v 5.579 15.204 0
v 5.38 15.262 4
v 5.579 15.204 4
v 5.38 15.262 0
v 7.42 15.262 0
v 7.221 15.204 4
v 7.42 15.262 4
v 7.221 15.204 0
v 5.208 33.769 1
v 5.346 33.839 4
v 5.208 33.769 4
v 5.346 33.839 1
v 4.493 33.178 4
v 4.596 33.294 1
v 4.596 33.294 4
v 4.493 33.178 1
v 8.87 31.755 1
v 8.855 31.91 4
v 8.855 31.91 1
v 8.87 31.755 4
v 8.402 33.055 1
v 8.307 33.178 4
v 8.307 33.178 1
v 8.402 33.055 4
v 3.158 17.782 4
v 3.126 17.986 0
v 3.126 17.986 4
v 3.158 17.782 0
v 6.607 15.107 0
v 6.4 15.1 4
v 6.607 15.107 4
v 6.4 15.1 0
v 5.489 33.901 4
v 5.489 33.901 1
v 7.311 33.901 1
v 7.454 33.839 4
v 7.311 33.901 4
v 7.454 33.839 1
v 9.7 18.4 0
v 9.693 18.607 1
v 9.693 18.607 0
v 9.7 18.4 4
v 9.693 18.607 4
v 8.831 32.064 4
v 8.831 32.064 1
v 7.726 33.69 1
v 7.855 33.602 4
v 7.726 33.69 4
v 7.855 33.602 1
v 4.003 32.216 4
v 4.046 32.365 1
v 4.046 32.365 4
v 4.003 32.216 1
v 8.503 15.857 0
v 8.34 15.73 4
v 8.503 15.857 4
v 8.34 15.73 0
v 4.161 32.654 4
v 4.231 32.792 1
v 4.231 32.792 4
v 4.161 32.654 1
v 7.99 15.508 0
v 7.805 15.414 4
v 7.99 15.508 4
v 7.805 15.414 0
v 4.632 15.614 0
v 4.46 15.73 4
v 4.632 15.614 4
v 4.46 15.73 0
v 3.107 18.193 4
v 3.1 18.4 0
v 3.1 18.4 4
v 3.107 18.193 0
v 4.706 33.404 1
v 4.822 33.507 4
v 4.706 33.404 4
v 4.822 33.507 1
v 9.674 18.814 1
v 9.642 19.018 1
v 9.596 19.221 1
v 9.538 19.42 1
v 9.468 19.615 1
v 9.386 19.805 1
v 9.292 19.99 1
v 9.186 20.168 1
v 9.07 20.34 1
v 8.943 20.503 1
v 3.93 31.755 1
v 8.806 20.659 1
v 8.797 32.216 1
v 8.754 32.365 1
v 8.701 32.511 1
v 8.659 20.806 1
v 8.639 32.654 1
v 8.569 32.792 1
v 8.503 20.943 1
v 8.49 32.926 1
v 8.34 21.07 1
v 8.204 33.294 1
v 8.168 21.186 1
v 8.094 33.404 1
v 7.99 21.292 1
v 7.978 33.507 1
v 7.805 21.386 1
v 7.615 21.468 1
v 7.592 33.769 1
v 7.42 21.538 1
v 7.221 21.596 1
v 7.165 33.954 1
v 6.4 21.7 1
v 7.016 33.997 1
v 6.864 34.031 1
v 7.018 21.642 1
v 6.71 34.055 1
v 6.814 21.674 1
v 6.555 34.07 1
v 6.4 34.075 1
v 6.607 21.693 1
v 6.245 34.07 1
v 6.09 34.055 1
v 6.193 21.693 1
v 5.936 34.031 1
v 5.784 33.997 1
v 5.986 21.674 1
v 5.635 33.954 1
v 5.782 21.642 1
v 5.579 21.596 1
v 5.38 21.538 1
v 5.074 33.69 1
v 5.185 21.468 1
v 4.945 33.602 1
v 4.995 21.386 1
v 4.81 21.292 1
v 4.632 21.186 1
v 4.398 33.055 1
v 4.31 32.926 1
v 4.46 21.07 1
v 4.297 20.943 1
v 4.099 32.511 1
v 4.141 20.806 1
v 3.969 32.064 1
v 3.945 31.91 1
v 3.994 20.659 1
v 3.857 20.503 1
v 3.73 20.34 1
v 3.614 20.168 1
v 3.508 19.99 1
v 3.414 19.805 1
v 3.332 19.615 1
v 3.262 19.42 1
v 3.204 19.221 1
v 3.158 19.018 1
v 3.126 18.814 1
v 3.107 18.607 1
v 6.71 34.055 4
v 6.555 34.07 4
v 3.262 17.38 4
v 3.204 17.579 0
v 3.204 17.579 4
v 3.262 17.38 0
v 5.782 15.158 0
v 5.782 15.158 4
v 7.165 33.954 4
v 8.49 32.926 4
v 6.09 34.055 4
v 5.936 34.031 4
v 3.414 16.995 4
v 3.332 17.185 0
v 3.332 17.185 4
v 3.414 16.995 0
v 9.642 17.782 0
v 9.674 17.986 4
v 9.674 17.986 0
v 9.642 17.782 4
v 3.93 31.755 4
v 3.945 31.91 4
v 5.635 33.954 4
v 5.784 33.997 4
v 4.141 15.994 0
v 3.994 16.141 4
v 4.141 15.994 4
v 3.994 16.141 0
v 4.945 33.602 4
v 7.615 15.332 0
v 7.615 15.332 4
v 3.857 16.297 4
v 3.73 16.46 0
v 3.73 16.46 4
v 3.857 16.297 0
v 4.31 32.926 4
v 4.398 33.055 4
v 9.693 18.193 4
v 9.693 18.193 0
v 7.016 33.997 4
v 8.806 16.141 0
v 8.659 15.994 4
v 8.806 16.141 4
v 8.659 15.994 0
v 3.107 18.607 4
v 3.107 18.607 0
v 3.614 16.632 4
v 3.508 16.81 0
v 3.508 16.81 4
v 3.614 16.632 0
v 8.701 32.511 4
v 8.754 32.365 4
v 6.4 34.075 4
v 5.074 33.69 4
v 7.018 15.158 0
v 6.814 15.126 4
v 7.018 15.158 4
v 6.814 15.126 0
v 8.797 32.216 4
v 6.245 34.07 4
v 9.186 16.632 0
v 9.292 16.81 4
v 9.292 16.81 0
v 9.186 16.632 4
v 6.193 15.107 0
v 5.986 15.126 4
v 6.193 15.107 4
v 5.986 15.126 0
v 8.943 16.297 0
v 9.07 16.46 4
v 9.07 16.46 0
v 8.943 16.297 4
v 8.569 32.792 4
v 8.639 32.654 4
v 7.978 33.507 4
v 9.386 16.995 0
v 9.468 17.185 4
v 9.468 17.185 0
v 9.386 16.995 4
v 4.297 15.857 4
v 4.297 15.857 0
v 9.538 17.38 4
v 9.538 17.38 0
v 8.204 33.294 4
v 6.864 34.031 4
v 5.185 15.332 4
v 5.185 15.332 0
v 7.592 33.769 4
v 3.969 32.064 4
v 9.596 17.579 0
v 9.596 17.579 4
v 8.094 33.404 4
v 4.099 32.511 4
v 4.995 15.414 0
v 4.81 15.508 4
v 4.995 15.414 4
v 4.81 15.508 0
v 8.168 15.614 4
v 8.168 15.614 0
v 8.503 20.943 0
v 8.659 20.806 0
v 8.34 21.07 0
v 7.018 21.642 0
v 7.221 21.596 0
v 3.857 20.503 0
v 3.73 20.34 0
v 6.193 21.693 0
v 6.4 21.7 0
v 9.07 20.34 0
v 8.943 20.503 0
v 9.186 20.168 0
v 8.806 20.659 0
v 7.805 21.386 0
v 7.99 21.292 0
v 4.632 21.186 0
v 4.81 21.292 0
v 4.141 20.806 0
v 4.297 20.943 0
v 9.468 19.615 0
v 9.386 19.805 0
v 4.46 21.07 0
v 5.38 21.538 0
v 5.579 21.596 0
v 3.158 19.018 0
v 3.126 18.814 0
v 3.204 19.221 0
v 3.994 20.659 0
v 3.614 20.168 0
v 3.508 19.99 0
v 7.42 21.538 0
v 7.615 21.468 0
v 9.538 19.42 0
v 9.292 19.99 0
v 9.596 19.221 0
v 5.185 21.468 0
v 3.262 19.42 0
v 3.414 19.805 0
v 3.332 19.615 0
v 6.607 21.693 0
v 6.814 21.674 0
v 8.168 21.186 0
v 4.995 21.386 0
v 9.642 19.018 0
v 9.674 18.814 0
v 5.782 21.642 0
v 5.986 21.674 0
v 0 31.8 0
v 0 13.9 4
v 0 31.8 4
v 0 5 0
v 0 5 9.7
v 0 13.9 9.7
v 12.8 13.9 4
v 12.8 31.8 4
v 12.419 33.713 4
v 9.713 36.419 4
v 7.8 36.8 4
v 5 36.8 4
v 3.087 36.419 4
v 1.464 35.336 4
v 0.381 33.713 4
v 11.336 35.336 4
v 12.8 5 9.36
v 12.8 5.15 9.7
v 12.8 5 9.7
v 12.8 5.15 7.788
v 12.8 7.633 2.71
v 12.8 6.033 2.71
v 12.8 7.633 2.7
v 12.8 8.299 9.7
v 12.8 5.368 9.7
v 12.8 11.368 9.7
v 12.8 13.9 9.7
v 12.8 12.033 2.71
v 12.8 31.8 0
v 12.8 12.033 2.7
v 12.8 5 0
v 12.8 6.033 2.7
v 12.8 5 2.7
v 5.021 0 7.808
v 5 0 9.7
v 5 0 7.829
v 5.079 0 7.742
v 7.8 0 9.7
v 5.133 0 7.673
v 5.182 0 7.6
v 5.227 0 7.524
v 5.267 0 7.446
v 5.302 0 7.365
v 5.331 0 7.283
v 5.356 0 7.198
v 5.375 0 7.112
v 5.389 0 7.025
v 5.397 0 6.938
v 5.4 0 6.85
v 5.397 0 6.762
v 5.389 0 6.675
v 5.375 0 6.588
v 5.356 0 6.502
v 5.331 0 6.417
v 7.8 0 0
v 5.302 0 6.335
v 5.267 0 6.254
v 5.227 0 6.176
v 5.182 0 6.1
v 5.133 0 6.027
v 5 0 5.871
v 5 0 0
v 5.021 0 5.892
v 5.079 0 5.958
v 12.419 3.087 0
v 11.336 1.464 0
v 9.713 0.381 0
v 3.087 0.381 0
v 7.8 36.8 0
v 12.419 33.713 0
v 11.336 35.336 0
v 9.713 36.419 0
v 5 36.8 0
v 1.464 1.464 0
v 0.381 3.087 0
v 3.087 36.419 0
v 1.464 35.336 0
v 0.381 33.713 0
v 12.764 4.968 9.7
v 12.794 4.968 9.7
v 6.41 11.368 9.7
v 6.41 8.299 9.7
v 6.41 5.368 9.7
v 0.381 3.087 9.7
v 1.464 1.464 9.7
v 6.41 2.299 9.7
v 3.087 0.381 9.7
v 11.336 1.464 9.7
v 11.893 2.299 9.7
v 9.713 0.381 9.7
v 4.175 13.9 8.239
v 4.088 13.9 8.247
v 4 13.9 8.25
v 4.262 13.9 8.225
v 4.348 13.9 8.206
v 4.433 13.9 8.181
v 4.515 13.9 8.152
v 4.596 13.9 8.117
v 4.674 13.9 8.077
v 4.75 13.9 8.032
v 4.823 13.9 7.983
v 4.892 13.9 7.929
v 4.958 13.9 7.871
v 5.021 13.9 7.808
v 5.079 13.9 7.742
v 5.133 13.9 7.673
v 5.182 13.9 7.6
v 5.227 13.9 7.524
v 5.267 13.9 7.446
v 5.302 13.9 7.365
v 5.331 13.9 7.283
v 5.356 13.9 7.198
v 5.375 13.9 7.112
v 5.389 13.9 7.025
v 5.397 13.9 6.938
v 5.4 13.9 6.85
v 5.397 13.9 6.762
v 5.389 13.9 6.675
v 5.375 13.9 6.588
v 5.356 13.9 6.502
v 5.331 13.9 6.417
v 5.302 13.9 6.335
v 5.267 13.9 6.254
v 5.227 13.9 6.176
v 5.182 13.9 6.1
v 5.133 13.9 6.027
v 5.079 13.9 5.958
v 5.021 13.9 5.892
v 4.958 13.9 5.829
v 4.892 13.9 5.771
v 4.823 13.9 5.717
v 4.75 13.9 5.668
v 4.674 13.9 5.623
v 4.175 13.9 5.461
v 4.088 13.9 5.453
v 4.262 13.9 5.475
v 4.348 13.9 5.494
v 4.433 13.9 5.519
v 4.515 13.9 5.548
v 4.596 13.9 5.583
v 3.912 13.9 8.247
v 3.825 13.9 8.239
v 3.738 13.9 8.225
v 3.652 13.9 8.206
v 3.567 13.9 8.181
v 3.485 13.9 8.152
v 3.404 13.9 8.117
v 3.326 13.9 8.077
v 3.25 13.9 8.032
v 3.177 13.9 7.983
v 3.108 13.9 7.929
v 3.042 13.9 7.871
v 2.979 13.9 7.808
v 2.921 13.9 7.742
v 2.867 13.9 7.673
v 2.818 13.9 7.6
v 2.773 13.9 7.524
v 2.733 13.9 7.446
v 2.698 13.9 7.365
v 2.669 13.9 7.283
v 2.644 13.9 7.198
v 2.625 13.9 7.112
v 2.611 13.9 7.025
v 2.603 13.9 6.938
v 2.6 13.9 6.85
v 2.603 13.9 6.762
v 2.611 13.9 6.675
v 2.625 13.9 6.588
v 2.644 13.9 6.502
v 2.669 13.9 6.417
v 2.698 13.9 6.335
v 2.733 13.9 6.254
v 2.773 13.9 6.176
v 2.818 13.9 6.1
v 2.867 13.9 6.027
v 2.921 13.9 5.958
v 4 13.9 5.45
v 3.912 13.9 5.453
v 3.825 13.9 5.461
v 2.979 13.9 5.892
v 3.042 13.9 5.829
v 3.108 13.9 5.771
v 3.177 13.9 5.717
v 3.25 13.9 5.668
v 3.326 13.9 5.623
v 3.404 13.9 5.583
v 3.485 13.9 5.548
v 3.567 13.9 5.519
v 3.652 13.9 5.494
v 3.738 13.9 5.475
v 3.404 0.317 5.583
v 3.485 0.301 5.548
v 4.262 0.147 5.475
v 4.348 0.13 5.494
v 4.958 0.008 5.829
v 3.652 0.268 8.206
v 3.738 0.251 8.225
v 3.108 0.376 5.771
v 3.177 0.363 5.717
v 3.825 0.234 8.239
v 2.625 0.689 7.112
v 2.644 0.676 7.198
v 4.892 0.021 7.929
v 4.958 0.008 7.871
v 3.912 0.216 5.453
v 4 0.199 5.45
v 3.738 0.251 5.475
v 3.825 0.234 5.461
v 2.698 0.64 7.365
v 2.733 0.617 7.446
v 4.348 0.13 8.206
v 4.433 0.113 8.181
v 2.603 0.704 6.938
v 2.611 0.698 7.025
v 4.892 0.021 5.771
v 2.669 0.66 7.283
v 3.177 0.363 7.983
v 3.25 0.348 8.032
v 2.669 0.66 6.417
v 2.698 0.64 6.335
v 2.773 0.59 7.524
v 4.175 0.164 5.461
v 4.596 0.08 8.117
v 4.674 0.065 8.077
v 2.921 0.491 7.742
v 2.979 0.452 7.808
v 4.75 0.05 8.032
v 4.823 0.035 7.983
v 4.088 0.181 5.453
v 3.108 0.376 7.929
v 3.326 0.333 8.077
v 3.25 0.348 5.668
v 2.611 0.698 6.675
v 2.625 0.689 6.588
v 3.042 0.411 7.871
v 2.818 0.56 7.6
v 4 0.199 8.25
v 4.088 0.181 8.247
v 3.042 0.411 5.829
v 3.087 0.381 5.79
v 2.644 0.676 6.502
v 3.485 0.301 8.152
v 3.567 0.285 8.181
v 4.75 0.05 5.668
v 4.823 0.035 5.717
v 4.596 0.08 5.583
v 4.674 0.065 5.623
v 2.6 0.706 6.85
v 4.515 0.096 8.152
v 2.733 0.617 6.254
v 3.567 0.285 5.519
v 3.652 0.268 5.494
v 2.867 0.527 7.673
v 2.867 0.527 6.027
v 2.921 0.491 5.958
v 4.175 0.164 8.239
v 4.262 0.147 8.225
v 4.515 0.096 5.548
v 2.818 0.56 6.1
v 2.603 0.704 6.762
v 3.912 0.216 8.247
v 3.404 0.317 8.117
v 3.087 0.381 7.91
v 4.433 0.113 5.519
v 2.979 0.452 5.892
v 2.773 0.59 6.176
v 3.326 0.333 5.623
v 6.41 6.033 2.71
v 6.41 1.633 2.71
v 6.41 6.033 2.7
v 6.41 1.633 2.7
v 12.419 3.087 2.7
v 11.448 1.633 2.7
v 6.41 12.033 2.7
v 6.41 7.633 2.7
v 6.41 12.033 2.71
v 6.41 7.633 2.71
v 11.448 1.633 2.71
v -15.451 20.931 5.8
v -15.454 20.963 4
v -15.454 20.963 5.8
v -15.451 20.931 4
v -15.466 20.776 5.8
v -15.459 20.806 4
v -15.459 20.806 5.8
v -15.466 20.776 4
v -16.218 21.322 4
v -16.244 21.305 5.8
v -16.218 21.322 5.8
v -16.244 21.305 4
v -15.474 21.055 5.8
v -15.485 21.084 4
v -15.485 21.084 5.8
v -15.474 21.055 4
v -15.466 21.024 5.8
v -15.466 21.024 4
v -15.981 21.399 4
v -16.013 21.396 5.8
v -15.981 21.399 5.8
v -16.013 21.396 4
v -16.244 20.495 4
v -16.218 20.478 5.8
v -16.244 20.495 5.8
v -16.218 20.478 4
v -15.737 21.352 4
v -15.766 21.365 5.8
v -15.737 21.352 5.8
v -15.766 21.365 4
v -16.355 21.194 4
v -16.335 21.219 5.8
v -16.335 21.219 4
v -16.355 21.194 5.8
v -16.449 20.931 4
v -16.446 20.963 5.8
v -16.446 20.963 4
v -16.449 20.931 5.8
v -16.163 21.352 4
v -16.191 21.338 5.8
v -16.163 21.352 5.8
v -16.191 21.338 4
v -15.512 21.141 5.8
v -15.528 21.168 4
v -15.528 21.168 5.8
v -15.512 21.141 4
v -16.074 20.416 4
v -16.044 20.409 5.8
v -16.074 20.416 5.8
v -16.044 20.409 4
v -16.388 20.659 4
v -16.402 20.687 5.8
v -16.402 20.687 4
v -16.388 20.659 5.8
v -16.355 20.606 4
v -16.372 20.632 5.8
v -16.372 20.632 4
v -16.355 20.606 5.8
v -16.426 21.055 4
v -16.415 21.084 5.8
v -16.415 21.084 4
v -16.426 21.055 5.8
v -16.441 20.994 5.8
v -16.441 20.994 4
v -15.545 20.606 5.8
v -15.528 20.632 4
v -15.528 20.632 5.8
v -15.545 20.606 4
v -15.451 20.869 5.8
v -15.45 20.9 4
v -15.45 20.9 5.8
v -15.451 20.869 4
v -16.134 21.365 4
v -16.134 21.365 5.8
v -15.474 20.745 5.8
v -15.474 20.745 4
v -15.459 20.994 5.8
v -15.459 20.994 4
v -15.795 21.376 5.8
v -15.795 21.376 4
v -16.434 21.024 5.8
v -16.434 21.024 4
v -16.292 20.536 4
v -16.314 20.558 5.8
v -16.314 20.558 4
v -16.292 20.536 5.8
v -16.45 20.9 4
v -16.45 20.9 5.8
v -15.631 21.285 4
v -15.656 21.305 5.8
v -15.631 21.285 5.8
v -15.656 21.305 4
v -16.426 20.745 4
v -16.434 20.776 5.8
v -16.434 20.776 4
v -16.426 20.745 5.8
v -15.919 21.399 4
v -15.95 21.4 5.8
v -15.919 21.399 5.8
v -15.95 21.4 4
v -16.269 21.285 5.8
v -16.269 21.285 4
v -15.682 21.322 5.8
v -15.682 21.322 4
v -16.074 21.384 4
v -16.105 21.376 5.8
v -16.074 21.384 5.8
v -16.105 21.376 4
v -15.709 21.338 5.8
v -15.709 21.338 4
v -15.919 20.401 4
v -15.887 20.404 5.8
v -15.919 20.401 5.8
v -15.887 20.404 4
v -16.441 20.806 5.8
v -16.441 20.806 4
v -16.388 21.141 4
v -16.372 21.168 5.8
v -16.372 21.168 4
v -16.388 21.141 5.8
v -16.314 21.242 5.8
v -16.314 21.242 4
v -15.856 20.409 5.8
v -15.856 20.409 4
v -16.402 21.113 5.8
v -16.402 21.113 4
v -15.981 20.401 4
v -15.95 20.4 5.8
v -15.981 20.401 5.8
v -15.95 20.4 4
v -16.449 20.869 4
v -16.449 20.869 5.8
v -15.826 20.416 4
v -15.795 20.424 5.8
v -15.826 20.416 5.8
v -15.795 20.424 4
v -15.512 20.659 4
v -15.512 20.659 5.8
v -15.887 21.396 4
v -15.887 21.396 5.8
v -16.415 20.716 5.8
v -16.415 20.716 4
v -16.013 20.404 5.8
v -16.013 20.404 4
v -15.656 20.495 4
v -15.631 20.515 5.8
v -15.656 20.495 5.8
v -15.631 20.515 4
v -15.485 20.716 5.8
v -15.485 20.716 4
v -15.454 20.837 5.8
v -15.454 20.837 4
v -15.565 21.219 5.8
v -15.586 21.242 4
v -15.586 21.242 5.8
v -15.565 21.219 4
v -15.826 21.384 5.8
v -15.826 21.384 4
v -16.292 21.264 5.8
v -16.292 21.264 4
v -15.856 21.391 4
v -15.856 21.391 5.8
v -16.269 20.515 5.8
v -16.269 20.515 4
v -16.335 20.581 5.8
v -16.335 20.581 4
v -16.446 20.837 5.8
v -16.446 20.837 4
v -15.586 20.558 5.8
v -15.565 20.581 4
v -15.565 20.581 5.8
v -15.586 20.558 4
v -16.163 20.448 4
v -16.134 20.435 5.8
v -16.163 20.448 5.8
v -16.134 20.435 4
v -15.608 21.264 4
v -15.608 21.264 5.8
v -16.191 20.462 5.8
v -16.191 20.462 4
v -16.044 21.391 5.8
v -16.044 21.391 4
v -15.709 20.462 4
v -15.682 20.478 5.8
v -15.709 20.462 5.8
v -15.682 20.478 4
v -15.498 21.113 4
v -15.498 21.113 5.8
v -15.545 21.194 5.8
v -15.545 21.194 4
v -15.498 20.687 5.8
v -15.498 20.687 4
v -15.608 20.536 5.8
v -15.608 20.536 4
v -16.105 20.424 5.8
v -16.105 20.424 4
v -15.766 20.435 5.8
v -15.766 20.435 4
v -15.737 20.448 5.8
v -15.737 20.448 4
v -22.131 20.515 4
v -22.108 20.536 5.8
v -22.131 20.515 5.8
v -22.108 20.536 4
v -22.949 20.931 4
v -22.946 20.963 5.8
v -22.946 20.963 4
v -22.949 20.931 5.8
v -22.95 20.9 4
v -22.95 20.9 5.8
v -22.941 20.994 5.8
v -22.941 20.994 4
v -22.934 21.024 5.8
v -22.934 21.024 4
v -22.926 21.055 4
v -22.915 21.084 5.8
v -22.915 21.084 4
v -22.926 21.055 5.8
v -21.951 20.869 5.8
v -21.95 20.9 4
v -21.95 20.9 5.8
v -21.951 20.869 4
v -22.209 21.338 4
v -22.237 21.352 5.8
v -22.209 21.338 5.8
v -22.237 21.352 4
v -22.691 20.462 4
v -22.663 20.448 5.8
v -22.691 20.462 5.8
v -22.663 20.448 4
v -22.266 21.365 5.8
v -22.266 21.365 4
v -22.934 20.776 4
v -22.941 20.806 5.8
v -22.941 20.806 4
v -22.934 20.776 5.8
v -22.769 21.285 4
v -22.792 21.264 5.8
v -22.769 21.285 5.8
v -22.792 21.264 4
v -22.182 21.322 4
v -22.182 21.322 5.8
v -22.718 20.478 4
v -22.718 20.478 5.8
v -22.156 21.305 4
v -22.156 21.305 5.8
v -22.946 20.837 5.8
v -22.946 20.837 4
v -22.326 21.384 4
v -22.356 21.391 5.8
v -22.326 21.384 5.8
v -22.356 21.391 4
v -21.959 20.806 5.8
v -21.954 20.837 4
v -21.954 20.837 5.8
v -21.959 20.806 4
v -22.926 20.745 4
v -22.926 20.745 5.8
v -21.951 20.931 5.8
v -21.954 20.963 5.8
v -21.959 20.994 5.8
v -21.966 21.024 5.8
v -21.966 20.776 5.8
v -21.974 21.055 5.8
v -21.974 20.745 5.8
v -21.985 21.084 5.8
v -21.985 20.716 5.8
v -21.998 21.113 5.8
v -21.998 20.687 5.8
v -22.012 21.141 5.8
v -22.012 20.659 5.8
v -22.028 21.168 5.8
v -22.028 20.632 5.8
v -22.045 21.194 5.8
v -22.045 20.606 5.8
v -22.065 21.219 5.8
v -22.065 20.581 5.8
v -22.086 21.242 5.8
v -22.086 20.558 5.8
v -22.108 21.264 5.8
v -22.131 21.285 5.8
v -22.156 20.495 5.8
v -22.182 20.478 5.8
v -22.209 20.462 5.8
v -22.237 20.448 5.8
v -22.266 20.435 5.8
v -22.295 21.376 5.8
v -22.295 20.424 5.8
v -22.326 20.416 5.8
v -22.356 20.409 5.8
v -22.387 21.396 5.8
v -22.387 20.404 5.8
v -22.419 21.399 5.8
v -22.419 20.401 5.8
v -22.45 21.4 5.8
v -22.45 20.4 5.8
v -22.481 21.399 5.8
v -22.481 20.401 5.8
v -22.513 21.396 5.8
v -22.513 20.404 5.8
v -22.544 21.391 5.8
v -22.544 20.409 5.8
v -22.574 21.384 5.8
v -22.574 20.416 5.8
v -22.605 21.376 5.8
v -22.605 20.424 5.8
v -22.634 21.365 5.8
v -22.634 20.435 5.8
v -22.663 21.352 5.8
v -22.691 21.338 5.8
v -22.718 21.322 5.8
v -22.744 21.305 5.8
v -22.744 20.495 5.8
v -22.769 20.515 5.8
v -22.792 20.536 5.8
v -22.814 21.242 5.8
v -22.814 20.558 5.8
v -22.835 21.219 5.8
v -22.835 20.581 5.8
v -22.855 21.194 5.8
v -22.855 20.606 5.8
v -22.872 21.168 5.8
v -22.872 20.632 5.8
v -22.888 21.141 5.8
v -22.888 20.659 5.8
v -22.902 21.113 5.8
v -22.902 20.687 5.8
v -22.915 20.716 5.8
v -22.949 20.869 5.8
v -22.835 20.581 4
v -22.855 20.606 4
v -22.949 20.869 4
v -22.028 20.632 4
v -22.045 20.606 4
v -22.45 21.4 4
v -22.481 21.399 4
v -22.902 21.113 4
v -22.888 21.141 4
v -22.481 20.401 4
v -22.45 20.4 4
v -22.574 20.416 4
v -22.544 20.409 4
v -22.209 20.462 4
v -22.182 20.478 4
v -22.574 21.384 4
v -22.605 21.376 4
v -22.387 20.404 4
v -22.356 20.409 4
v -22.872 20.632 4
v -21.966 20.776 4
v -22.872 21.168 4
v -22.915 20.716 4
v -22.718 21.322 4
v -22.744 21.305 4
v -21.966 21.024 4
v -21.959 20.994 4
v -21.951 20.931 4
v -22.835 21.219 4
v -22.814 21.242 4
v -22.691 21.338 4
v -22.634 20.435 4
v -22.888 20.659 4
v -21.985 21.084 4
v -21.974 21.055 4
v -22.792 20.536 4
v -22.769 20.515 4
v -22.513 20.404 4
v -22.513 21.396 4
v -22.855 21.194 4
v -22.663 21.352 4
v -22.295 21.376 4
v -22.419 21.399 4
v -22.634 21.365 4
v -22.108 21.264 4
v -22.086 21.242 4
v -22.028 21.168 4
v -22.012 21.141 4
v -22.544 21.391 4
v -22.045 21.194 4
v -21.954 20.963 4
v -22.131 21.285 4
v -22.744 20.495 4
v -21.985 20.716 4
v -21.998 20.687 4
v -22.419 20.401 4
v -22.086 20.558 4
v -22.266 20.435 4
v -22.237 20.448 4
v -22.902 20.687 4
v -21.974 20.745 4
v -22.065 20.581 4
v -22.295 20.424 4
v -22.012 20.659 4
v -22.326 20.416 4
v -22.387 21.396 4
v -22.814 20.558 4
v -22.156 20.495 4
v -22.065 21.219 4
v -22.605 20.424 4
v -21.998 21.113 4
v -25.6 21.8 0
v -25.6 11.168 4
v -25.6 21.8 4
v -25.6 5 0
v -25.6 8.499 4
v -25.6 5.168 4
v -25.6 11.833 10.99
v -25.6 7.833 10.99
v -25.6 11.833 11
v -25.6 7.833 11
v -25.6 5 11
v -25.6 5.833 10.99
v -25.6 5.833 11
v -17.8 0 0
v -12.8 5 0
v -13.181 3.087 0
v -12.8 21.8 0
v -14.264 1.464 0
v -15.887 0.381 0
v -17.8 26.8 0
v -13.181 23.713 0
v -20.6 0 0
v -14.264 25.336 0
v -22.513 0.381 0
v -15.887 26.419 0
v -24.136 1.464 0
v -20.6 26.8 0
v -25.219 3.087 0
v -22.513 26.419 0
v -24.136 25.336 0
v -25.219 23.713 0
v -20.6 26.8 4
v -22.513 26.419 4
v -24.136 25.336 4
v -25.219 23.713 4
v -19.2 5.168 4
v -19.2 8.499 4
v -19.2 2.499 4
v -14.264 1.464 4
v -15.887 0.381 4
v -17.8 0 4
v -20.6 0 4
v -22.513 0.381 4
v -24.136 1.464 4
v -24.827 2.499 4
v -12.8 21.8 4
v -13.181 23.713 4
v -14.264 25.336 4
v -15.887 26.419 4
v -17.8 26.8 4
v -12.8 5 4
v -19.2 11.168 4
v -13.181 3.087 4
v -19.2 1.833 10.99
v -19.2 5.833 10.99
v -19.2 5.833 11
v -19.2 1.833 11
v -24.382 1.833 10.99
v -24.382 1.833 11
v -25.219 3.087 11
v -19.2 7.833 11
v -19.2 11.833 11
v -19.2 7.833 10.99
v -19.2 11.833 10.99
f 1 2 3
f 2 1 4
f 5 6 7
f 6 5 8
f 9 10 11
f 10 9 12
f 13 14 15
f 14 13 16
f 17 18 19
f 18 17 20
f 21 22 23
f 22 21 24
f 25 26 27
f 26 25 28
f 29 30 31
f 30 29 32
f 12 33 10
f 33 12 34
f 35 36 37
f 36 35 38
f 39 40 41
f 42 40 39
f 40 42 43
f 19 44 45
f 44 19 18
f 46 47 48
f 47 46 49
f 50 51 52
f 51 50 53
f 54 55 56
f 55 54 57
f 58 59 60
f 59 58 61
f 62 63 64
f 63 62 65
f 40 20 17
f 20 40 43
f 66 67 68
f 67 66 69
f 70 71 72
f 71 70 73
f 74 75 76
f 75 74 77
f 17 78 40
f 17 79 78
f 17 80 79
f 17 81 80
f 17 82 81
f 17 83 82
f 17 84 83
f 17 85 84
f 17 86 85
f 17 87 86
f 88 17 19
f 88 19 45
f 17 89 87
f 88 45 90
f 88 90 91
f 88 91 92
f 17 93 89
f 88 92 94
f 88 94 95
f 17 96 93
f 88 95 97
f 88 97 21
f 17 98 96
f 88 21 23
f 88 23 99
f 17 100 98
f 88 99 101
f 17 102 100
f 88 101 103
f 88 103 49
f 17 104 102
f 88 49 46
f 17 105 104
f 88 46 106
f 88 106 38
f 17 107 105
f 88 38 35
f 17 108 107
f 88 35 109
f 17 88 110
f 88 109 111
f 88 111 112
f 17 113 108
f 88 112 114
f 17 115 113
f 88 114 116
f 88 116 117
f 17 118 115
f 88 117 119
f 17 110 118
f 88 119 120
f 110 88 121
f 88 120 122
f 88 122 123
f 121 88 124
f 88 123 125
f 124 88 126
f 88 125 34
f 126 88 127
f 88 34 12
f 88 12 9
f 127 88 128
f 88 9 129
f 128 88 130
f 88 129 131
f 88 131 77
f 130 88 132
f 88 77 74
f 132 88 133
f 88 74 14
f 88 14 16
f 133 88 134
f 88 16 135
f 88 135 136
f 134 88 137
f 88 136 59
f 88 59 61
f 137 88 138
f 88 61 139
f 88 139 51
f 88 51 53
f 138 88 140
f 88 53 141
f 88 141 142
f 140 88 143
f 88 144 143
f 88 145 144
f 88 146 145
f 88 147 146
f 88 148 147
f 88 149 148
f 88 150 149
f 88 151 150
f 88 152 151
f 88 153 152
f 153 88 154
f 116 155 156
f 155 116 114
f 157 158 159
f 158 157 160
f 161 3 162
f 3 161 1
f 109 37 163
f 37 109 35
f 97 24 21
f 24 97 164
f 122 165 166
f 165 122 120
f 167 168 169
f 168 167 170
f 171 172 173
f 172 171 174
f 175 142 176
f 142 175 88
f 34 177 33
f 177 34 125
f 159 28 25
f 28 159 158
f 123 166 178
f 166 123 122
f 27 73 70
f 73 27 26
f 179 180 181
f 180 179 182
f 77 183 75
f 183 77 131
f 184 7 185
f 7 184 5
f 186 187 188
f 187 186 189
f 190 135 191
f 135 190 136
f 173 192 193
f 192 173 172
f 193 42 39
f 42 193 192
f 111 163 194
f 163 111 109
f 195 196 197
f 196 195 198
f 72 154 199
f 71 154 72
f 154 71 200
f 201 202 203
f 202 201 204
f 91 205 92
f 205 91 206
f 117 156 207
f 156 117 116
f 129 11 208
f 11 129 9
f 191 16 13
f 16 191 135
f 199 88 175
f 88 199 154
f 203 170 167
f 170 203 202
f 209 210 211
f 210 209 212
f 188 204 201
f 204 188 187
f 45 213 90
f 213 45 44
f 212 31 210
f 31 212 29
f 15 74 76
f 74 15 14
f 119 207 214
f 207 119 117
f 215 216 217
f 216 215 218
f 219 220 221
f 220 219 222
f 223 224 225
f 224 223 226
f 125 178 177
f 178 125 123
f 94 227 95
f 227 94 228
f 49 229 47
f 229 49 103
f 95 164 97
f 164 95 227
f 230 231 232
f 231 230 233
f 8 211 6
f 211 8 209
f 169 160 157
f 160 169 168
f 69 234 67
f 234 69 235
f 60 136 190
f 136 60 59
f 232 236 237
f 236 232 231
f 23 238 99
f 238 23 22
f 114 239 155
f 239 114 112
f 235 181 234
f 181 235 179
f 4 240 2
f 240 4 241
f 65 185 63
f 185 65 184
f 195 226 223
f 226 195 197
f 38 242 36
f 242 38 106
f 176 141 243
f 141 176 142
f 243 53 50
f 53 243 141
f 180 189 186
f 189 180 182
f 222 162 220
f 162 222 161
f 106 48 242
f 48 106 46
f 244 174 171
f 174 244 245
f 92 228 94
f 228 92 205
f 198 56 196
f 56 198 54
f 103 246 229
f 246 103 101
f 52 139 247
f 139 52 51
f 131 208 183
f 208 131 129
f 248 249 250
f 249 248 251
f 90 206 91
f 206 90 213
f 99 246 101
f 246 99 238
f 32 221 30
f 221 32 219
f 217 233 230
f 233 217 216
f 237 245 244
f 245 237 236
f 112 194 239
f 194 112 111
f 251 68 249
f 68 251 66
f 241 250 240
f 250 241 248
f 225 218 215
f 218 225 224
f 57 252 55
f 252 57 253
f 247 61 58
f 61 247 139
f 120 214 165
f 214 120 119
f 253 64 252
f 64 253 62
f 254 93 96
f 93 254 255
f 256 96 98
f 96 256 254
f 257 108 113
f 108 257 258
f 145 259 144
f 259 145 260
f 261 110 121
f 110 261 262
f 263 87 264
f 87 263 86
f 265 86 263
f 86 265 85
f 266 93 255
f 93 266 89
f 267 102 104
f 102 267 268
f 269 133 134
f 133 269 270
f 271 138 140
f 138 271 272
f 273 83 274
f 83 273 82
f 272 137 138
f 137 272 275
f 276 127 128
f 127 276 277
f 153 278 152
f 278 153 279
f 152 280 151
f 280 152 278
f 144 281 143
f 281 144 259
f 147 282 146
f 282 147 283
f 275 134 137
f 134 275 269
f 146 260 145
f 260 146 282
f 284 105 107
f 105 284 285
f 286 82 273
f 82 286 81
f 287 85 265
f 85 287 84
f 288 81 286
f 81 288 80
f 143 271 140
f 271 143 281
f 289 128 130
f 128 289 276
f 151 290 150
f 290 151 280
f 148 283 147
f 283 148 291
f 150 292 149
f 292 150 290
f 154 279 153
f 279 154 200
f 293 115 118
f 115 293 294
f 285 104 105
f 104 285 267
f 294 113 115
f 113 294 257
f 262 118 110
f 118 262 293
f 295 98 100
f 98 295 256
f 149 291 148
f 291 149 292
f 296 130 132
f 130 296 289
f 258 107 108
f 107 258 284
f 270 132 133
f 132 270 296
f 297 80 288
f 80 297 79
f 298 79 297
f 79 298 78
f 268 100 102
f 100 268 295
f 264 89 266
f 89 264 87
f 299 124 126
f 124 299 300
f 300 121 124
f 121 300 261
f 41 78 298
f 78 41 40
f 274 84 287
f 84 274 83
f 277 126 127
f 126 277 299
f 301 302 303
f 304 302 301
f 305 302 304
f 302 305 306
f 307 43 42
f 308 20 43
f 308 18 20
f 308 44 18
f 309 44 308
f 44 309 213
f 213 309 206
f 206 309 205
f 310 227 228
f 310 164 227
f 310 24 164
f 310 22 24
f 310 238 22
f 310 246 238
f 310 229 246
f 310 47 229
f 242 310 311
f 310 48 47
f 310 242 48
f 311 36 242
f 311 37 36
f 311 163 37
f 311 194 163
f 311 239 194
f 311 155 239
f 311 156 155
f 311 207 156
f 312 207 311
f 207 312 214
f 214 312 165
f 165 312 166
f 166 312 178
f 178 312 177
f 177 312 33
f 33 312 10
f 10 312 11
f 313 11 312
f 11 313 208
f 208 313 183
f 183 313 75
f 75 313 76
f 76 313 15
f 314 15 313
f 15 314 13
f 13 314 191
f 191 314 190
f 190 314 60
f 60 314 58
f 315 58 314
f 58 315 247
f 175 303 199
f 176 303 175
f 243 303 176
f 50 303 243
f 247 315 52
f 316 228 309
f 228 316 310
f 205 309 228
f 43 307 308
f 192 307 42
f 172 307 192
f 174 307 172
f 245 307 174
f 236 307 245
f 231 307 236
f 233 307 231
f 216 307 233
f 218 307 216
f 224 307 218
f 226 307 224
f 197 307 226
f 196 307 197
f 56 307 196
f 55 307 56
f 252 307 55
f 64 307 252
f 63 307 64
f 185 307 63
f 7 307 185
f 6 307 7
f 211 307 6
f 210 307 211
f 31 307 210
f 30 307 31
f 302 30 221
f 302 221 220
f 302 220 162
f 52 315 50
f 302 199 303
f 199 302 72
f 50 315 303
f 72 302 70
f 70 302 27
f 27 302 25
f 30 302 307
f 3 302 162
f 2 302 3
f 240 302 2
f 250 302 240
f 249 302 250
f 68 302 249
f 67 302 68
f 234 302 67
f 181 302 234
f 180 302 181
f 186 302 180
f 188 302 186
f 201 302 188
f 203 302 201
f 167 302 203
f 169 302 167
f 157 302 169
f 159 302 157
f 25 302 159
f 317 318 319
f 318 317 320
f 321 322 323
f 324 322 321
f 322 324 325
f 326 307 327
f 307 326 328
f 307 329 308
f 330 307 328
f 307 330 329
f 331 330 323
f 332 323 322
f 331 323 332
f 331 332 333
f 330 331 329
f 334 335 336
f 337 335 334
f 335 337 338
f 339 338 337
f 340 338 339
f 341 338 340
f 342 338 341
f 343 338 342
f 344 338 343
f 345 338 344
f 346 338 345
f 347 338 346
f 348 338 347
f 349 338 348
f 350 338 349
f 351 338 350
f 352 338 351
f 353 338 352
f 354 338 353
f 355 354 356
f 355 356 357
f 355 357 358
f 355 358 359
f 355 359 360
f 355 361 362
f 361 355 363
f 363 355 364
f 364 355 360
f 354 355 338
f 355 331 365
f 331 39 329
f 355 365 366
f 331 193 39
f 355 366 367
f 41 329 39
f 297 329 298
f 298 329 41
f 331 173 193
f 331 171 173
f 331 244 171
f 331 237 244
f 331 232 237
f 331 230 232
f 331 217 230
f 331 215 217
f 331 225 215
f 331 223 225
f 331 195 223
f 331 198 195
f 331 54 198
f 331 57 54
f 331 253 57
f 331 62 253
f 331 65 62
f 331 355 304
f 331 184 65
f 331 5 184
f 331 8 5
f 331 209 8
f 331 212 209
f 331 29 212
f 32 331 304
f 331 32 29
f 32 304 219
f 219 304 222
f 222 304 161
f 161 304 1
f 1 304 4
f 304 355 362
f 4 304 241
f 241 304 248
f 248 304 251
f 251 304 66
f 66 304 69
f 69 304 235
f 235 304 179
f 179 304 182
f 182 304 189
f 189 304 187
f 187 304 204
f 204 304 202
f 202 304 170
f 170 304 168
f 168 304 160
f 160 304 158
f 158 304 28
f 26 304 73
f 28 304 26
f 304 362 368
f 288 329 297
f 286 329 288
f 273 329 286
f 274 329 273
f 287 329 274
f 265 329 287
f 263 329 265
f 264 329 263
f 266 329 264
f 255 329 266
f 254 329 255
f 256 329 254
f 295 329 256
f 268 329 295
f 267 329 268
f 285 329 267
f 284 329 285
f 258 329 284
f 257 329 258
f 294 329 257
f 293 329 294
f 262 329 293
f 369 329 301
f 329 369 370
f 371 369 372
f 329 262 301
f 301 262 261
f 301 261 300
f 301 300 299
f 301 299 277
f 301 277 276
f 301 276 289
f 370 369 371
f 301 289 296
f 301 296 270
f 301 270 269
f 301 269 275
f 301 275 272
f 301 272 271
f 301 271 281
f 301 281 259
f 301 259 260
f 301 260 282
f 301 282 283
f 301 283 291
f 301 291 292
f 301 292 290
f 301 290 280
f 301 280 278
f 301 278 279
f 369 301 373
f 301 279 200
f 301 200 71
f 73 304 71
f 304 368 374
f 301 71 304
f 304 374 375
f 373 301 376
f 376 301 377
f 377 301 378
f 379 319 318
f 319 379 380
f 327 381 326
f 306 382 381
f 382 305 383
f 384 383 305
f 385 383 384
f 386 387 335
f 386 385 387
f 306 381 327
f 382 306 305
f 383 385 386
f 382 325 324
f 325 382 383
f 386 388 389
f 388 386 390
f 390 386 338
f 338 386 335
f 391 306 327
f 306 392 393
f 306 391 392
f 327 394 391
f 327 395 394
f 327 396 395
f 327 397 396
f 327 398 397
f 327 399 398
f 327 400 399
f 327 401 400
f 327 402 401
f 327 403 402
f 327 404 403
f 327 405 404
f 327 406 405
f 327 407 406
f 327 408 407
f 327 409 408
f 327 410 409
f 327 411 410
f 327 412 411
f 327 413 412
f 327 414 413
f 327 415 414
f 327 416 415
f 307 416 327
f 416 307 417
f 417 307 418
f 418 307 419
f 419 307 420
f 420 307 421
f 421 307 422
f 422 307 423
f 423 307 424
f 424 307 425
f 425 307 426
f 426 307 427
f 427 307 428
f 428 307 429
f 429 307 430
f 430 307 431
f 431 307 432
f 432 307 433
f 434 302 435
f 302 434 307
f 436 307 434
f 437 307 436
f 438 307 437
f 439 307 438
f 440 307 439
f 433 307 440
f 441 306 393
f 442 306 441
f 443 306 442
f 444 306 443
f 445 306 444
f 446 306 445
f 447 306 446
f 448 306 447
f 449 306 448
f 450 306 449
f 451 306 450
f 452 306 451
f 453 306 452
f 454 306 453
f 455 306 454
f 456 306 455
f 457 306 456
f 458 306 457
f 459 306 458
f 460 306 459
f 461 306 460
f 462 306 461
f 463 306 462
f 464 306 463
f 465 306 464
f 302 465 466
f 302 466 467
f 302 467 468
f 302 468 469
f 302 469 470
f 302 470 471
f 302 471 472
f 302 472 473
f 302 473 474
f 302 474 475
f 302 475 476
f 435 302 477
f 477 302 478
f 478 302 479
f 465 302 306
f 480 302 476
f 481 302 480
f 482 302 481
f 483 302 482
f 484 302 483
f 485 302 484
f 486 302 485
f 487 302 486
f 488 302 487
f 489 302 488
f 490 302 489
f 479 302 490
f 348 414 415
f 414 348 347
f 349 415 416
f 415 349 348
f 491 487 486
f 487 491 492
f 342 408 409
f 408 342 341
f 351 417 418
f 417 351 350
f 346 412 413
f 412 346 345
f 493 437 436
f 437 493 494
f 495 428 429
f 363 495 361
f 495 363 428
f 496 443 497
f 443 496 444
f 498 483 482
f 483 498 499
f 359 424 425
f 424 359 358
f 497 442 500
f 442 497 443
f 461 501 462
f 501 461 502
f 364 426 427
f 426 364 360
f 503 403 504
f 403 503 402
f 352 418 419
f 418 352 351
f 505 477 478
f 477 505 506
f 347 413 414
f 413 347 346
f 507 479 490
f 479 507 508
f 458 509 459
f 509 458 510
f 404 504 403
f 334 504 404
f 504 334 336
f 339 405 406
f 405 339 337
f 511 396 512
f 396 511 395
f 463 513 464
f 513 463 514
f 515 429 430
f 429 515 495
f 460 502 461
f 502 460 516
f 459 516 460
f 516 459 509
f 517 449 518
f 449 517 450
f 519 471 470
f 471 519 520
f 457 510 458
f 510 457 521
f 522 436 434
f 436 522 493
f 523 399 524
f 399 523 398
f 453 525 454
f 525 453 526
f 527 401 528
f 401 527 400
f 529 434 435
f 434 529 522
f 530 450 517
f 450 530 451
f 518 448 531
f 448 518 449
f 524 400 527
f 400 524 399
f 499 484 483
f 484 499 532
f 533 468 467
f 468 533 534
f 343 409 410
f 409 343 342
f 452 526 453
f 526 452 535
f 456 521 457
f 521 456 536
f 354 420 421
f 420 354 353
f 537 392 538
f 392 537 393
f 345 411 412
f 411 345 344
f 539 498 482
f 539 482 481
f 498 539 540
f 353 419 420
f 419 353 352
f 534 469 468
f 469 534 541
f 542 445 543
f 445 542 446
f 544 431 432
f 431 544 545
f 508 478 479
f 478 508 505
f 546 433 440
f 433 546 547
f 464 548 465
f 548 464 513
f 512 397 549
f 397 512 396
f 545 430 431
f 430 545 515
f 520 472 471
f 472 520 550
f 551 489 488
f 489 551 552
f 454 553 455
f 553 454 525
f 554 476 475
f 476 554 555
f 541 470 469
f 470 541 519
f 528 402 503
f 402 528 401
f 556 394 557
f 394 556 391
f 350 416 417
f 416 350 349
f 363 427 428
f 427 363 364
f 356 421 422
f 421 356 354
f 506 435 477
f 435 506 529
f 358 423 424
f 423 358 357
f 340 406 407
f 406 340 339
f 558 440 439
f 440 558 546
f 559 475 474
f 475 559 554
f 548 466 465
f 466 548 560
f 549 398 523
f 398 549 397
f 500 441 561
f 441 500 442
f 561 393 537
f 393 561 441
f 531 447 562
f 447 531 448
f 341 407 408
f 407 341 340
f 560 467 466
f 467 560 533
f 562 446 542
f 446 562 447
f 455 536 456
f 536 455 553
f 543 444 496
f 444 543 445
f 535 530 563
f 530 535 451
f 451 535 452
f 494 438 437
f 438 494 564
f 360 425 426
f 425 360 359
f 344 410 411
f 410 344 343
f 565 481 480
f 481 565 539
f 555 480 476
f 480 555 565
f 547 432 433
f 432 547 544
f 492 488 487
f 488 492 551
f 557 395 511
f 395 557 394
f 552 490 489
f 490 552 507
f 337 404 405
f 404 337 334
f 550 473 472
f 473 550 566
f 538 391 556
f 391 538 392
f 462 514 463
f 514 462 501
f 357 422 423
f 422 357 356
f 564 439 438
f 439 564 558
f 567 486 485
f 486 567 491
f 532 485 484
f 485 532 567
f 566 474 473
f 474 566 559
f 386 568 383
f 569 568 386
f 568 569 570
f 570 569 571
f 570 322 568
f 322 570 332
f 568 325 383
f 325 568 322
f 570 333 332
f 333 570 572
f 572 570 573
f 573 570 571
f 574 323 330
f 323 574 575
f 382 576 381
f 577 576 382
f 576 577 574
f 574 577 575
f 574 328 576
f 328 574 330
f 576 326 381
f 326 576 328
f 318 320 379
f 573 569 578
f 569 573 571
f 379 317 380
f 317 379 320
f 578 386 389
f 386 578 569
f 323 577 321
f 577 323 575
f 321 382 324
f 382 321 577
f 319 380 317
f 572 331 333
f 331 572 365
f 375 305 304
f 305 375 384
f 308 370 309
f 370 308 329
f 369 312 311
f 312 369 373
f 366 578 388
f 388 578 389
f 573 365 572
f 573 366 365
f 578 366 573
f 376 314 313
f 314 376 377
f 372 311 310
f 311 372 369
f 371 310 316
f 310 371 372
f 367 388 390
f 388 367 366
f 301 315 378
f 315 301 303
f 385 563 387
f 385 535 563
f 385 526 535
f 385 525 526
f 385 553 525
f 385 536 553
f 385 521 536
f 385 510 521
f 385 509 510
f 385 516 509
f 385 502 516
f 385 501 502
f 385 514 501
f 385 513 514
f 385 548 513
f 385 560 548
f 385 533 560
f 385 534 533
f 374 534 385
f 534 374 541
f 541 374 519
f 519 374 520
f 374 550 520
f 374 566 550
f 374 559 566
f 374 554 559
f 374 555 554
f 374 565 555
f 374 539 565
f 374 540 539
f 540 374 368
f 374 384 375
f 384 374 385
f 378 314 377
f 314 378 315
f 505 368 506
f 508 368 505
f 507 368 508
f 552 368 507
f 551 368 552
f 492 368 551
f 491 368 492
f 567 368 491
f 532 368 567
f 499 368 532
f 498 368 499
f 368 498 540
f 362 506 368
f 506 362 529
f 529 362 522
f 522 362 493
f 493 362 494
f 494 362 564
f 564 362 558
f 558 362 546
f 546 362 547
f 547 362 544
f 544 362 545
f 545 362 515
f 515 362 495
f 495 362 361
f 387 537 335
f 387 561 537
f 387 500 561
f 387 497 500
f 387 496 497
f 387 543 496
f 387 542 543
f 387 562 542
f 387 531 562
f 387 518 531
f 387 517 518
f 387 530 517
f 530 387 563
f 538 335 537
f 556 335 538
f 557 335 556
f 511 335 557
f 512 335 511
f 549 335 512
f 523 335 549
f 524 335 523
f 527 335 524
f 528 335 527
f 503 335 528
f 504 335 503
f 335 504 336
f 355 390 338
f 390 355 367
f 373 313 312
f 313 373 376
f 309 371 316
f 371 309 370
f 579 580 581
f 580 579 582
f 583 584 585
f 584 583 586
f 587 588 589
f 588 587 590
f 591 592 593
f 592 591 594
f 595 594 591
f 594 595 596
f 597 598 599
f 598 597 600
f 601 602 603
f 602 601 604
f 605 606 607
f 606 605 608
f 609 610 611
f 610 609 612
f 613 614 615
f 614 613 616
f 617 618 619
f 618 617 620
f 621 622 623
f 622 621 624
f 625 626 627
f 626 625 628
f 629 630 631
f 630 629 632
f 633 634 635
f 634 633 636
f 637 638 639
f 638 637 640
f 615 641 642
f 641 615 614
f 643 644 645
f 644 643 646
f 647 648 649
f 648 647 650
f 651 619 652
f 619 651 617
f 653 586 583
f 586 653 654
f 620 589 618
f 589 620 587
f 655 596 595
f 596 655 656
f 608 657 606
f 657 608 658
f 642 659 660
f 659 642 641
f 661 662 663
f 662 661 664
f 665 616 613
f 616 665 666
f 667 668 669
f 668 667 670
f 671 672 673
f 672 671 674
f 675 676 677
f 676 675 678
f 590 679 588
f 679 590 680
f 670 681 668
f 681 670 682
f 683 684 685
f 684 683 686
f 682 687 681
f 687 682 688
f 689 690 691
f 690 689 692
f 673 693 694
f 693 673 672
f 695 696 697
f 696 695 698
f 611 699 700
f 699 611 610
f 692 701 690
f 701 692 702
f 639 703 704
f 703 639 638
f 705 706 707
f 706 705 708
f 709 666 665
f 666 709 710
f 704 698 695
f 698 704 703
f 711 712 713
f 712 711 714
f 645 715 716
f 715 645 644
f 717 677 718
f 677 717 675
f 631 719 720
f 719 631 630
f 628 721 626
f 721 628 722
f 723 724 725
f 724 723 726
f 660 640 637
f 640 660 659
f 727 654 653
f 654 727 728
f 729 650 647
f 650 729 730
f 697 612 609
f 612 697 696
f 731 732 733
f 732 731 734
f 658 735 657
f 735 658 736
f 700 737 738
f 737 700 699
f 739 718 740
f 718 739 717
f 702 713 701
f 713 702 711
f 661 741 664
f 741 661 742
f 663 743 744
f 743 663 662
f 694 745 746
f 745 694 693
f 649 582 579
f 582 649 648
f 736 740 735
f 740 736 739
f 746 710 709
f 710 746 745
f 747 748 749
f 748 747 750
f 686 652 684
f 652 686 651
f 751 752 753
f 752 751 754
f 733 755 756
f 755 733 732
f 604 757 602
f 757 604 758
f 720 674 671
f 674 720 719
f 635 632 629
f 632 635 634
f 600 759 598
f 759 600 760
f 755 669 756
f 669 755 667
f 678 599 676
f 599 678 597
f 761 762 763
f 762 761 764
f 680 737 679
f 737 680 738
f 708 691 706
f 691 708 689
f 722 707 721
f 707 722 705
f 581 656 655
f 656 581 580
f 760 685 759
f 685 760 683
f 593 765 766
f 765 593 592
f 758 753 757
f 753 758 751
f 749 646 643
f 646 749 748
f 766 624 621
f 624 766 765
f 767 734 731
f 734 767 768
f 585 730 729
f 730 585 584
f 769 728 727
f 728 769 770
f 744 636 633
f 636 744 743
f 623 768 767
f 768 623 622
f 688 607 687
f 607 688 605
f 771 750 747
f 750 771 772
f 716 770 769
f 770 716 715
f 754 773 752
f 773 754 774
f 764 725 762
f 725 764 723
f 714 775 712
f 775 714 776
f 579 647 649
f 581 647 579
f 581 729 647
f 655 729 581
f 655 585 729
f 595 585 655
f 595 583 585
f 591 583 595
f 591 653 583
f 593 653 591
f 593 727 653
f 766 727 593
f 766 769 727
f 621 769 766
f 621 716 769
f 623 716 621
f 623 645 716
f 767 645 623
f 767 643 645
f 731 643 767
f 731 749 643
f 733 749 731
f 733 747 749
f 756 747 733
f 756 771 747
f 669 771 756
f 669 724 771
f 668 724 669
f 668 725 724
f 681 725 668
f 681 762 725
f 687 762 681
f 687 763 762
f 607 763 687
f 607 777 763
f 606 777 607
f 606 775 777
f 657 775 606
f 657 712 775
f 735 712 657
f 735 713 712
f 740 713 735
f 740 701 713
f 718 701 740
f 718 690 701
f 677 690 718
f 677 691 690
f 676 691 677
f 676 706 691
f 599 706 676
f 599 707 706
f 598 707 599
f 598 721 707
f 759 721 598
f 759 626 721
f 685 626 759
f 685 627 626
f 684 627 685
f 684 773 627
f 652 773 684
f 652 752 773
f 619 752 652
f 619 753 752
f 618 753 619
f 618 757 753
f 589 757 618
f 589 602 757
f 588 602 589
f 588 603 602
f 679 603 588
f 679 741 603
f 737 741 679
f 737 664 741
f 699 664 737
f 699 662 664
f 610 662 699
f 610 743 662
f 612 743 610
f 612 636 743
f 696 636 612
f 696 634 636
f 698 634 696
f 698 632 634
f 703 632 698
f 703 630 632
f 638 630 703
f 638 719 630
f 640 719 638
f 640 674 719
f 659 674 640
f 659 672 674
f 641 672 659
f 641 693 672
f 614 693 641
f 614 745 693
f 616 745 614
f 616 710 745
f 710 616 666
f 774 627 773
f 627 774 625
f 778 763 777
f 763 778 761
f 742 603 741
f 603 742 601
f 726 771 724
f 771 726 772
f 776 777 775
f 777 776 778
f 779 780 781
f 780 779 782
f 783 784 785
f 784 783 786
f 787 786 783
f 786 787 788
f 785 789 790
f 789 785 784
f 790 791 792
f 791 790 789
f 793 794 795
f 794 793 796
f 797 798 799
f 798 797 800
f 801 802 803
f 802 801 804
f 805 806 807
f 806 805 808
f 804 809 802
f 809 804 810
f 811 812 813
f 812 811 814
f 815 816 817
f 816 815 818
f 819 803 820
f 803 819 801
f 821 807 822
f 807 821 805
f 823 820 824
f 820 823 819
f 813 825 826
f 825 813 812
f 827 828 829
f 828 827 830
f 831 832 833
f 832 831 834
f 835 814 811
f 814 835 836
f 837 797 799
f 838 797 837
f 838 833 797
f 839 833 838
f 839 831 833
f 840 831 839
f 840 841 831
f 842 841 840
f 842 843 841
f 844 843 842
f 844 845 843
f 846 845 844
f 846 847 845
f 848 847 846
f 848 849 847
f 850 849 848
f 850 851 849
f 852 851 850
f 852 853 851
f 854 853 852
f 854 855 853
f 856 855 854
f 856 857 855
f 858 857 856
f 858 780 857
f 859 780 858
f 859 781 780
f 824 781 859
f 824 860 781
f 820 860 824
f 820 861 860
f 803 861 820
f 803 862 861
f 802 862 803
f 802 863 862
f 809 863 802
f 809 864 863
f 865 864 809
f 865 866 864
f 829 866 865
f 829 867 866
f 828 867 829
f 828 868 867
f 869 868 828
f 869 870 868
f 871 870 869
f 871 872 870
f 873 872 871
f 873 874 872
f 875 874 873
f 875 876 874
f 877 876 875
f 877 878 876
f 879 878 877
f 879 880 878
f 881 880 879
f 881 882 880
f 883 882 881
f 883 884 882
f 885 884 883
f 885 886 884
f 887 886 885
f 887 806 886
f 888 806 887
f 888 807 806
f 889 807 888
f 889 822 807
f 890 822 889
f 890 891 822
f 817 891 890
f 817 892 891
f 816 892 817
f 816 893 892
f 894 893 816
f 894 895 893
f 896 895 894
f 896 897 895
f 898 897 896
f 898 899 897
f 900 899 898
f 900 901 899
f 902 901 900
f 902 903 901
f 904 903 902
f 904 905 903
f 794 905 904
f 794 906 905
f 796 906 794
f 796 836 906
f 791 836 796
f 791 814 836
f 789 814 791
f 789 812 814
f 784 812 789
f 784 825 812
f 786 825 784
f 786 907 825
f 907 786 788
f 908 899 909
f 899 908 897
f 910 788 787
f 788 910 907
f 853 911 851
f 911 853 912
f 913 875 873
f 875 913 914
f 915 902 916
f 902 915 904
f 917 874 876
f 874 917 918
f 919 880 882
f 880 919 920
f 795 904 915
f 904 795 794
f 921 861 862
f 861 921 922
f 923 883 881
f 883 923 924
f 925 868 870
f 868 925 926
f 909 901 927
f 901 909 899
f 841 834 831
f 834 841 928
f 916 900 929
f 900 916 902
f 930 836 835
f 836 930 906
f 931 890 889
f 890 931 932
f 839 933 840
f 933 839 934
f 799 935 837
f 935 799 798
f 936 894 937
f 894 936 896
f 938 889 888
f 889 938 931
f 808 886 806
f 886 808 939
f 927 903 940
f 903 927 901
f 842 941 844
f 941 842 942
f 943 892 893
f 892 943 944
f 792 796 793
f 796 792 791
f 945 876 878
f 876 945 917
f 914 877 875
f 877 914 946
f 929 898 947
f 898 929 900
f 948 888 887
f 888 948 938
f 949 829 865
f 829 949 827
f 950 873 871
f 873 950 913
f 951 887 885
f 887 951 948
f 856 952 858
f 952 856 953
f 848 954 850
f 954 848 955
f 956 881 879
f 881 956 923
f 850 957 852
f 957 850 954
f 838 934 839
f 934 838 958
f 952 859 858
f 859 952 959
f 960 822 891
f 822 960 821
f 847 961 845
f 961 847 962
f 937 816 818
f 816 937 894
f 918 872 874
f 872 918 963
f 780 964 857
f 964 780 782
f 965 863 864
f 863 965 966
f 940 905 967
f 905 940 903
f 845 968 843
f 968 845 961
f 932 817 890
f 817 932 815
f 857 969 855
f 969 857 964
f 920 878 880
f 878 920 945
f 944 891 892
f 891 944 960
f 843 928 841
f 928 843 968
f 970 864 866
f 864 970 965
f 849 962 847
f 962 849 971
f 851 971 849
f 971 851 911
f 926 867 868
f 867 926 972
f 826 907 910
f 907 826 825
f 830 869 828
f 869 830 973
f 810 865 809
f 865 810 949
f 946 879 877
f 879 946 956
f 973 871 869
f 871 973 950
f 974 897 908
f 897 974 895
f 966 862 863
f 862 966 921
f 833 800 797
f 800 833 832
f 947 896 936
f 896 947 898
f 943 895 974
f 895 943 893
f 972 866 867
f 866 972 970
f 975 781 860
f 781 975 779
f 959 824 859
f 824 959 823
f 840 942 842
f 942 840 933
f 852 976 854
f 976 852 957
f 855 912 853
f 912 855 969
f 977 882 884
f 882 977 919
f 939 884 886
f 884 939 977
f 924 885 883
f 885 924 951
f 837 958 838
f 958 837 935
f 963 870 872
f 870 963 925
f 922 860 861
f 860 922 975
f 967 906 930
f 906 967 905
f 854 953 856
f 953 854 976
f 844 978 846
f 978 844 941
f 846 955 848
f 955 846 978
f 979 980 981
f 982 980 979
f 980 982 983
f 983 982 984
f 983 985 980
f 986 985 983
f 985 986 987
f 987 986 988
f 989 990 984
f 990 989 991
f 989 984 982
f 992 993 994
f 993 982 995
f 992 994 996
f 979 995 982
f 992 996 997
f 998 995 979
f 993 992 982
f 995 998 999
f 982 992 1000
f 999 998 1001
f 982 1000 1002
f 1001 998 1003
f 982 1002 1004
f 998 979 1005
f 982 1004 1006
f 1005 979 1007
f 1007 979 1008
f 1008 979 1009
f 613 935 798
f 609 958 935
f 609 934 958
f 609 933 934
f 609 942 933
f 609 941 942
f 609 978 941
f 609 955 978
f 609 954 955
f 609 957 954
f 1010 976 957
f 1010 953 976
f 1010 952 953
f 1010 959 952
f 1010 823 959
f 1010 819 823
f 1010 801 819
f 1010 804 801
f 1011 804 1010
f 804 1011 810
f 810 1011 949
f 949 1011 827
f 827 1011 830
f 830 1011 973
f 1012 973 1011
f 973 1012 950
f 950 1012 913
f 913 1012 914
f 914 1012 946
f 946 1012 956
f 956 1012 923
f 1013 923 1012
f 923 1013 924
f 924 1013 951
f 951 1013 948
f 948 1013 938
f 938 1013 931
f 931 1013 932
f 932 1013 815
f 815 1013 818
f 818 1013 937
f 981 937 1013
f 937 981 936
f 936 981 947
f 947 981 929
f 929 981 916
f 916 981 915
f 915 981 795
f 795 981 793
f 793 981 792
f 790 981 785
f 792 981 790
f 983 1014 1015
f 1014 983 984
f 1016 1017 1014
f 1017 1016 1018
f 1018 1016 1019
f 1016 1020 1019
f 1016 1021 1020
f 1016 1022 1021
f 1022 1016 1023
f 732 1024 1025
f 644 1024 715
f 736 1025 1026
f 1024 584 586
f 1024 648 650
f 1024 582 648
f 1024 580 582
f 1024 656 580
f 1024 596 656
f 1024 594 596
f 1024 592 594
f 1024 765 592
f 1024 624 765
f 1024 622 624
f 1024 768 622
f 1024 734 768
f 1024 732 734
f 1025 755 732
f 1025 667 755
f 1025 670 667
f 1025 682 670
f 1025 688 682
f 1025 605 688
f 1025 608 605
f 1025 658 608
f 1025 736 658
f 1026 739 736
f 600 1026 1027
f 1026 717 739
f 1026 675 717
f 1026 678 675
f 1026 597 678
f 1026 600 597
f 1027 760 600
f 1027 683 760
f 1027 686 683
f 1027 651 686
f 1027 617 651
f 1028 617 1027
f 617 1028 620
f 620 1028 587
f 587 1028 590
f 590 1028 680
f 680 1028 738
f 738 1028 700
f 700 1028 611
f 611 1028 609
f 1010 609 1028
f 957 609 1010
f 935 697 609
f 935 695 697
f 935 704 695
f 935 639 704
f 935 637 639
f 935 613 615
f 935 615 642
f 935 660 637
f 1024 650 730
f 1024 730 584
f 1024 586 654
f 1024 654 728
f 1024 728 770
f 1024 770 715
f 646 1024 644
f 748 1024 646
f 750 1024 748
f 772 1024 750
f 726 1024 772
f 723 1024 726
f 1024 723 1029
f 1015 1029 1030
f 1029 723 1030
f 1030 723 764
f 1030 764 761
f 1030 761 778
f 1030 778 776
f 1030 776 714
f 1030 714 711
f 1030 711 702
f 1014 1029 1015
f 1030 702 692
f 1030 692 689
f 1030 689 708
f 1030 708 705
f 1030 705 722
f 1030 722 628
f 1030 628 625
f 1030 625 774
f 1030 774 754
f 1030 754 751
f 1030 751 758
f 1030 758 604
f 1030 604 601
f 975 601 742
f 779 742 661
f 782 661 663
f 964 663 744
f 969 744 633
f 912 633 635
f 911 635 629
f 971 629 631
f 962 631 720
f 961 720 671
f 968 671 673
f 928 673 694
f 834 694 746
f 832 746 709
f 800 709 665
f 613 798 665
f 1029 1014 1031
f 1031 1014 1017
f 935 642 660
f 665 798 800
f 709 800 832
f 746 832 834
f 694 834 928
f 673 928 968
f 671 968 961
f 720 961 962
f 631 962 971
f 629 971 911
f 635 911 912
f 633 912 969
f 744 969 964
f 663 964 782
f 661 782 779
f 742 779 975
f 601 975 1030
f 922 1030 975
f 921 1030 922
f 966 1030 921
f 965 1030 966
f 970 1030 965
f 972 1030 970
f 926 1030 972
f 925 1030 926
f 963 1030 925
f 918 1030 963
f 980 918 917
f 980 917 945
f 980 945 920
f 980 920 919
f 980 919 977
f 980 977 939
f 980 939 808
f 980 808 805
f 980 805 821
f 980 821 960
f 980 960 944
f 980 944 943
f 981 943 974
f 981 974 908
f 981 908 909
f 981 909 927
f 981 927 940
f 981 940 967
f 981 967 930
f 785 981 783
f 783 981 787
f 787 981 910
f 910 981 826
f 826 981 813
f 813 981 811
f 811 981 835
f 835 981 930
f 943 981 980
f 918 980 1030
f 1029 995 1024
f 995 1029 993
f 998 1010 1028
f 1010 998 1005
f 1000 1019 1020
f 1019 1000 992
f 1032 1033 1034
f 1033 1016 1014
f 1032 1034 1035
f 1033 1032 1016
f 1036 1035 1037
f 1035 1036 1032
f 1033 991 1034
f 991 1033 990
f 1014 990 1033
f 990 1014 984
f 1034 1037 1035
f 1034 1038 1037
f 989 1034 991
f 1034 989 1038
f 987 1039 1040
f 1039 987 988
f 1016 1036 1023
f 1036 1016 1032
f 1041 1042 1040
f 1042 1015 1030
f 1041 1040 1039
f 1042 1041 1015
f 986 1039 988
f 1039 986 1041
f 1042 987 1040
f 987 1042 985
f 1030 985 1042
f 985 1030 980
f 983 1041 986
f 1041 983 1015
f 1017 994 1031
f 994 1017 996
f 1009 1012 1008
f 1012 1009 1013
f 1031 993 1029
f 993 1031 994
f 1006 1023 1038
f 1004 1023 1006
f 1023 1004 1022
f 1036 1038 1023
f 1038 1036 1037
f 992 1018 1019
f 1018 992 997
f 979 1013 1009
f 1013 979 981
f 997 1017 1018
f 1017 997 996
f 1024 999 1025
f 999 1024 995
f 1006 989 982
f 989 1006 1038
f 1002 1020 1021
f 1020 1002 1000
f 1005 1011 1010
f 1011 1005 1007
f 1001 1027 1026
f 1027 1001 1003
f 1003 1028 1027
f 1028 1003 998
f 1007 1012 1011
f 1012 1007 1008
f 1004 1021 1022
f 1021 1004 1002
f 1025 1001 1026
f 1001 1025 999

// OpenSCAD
// Compact Z-Probe
// Author: Reid Linnemann <linnemannr@gmail.com>

//units are mm
switch_width = 12.8;
switch_height = 5;
switch_thickness = 5.7;
switch_hole_diameter = 1.5;
switch_hole_spacing = 6.5;
switch_hole_offset = 1.5;
switch_operating_height = 5.5;


armature_diameter = 2;
shaft_length = 4;
shaft_clearance = 1;
armature_thickness = .75;

probe_diameter = 2.8;
probe_clearance = 0.5;

base_thickness = shaft_length;

switch_hole_depth = switch_thickness/2;

guide_padding = 12;
guide_y = switch_width/2 - switch_operating_height - -switch_hole_offset - probe_clearance + guide_padding;

dovetail_width = switch_width/2;

guide_thickness = base_thickness + switch_thickness;

guide_roundness = 5;

module armature(collar_d, collar_h, shoulder_d, shoulder_h, l) {
    union() {
        hull() {
            cylinder(h=10, shoulder_h, r=shoulder_d/2, $fn=100);
            translate([0, -l, 0])
                cylinder(h=shoulder_h, r=2.25, $fn=100);
        };
        translate([0,0,1])
        rotate([180,0,0])
            cylinder(h=collar_h+1, r=collar_d/2, $fn=100);
   }
}

module screwtap(r,d) {
    translate([0,0,0.1])
    cylinder(r=r, h=d+0.1, $fn=100);
}

module screwtaps(r,d,w) {
    for(x=[-2, 2]) {
        translate([w/x, 0, 0])
            screwtap(r,d);
    }
}

module probe_guide() {
    difference() {
        cube([switch_width, guide_y, switch_thickness+base_thickness]);
        translate([4, switch_width/2+guide_padding, switch_thickness/2+base_thickness])
            rotate([90,0,0])
                cylinder(r=probe_diameter/2, h=switch_width+guide_padding, $fn=100);
    }
}
module plate(w,h) {
    hull() {
        cube([w, 2*w+guide_padding, h]);
        cube([w/4, w+guide_padding, h]);

    }
}

module full_plate(w,h) {
    difference() {
        plate(w,h);
        translate([w/2,w/2+guide_padding,h-3])
            rotate([0,0,180])
                scale(v=1.1)
                    armature(6,6,6,4,12);
    }
}

module dovetail(w,h,l) {
    hull() {
        cube([l, 2*w/3, .01]);
        translate([0,-w/6,-h])
            cube([l,w,.01]);
    }
}
module switch_captor(w,h) {
    intersection(){
    hull() {
        translate([guide_roundness, guide_roundness, h])
            rotate([180,0,0])
                cylinder(r=guide_roundness, h=2.75*h);
        translate([switch_width - guide_roundness,       guide_roundness, h])
            rotate([180,0,0])
                cylinder(r=guide_roundness, h=2.75*h);
        translate([guide_roundness, w+2+guide_padding-guide_roundness, h])
            rotate([180,0,0])
                cylinder(r=guide_roundness, h=2.75*h);
        translate([switch_width-guide_roundness, w+2+ guide_padding-guide_roundness, h])
            rotate([180,0,0])
                cylinder(r=guide_roundness, h=2.75*h);
    }
    union() {
        cube([w, w+2+guide_padding, h]);
        translate([w-dovetail_width, guide_padding/4-.5, 0])
            dovetail(4, 1.75*h, dovetail_width);
        translate([w-dovetail_width, 3*guide_padding/4-.5, 0])
            dovetail(4, 1.75*h, dovetail_width);
        translate([w/2,(switch_height + w)/2+guide_padding, -switch_hole_depth*2/3])
            screwtaps(switch_hole_diameter/3, 2*switch_hole_depth/3,
                switch_hole_spacing);
    }
    }
}
module assembled_guide() {
    intersection() {
    hull() {
        translate([guide_roundness, guide_roundness])
            cylinder(r=guide_roundness, h=guide_thickness);
        translate([switch_width - guide_roundness,       guide_roundness])
            cylinder(r=guide_roundness, h=guide_thickness);
        translate([guide_roundness, 12+switch_width+guide_padding-guide_roundness])
            cylinder(r=guide_roundness, h=guide_thickness);
        translate([switch_width-guide_roundness, 12+switch_width+guide_padding-guide_roundness])
            cylinder(r=guide_roundness, h=guide_thickness);
    }
    difference() {
        union() {
            full_plate(switch_width,base_thickness);
            probe_guide();
        }
        translate([.01,0,base_thickness + switch_thickness]) {
            union() {
                translate([0,.2,0])
                    switch_captor(switch_width,base_thickness);
                translate([0,-.2,0])
                    switch_captor(switch_width,base_thickness);
            }
        }
    }
    }
}

assembled_guide();
translate([-switch_width,0,base_thickness])
rotate([0,180,0])
switch_captor(switch_width, base_thickness);
